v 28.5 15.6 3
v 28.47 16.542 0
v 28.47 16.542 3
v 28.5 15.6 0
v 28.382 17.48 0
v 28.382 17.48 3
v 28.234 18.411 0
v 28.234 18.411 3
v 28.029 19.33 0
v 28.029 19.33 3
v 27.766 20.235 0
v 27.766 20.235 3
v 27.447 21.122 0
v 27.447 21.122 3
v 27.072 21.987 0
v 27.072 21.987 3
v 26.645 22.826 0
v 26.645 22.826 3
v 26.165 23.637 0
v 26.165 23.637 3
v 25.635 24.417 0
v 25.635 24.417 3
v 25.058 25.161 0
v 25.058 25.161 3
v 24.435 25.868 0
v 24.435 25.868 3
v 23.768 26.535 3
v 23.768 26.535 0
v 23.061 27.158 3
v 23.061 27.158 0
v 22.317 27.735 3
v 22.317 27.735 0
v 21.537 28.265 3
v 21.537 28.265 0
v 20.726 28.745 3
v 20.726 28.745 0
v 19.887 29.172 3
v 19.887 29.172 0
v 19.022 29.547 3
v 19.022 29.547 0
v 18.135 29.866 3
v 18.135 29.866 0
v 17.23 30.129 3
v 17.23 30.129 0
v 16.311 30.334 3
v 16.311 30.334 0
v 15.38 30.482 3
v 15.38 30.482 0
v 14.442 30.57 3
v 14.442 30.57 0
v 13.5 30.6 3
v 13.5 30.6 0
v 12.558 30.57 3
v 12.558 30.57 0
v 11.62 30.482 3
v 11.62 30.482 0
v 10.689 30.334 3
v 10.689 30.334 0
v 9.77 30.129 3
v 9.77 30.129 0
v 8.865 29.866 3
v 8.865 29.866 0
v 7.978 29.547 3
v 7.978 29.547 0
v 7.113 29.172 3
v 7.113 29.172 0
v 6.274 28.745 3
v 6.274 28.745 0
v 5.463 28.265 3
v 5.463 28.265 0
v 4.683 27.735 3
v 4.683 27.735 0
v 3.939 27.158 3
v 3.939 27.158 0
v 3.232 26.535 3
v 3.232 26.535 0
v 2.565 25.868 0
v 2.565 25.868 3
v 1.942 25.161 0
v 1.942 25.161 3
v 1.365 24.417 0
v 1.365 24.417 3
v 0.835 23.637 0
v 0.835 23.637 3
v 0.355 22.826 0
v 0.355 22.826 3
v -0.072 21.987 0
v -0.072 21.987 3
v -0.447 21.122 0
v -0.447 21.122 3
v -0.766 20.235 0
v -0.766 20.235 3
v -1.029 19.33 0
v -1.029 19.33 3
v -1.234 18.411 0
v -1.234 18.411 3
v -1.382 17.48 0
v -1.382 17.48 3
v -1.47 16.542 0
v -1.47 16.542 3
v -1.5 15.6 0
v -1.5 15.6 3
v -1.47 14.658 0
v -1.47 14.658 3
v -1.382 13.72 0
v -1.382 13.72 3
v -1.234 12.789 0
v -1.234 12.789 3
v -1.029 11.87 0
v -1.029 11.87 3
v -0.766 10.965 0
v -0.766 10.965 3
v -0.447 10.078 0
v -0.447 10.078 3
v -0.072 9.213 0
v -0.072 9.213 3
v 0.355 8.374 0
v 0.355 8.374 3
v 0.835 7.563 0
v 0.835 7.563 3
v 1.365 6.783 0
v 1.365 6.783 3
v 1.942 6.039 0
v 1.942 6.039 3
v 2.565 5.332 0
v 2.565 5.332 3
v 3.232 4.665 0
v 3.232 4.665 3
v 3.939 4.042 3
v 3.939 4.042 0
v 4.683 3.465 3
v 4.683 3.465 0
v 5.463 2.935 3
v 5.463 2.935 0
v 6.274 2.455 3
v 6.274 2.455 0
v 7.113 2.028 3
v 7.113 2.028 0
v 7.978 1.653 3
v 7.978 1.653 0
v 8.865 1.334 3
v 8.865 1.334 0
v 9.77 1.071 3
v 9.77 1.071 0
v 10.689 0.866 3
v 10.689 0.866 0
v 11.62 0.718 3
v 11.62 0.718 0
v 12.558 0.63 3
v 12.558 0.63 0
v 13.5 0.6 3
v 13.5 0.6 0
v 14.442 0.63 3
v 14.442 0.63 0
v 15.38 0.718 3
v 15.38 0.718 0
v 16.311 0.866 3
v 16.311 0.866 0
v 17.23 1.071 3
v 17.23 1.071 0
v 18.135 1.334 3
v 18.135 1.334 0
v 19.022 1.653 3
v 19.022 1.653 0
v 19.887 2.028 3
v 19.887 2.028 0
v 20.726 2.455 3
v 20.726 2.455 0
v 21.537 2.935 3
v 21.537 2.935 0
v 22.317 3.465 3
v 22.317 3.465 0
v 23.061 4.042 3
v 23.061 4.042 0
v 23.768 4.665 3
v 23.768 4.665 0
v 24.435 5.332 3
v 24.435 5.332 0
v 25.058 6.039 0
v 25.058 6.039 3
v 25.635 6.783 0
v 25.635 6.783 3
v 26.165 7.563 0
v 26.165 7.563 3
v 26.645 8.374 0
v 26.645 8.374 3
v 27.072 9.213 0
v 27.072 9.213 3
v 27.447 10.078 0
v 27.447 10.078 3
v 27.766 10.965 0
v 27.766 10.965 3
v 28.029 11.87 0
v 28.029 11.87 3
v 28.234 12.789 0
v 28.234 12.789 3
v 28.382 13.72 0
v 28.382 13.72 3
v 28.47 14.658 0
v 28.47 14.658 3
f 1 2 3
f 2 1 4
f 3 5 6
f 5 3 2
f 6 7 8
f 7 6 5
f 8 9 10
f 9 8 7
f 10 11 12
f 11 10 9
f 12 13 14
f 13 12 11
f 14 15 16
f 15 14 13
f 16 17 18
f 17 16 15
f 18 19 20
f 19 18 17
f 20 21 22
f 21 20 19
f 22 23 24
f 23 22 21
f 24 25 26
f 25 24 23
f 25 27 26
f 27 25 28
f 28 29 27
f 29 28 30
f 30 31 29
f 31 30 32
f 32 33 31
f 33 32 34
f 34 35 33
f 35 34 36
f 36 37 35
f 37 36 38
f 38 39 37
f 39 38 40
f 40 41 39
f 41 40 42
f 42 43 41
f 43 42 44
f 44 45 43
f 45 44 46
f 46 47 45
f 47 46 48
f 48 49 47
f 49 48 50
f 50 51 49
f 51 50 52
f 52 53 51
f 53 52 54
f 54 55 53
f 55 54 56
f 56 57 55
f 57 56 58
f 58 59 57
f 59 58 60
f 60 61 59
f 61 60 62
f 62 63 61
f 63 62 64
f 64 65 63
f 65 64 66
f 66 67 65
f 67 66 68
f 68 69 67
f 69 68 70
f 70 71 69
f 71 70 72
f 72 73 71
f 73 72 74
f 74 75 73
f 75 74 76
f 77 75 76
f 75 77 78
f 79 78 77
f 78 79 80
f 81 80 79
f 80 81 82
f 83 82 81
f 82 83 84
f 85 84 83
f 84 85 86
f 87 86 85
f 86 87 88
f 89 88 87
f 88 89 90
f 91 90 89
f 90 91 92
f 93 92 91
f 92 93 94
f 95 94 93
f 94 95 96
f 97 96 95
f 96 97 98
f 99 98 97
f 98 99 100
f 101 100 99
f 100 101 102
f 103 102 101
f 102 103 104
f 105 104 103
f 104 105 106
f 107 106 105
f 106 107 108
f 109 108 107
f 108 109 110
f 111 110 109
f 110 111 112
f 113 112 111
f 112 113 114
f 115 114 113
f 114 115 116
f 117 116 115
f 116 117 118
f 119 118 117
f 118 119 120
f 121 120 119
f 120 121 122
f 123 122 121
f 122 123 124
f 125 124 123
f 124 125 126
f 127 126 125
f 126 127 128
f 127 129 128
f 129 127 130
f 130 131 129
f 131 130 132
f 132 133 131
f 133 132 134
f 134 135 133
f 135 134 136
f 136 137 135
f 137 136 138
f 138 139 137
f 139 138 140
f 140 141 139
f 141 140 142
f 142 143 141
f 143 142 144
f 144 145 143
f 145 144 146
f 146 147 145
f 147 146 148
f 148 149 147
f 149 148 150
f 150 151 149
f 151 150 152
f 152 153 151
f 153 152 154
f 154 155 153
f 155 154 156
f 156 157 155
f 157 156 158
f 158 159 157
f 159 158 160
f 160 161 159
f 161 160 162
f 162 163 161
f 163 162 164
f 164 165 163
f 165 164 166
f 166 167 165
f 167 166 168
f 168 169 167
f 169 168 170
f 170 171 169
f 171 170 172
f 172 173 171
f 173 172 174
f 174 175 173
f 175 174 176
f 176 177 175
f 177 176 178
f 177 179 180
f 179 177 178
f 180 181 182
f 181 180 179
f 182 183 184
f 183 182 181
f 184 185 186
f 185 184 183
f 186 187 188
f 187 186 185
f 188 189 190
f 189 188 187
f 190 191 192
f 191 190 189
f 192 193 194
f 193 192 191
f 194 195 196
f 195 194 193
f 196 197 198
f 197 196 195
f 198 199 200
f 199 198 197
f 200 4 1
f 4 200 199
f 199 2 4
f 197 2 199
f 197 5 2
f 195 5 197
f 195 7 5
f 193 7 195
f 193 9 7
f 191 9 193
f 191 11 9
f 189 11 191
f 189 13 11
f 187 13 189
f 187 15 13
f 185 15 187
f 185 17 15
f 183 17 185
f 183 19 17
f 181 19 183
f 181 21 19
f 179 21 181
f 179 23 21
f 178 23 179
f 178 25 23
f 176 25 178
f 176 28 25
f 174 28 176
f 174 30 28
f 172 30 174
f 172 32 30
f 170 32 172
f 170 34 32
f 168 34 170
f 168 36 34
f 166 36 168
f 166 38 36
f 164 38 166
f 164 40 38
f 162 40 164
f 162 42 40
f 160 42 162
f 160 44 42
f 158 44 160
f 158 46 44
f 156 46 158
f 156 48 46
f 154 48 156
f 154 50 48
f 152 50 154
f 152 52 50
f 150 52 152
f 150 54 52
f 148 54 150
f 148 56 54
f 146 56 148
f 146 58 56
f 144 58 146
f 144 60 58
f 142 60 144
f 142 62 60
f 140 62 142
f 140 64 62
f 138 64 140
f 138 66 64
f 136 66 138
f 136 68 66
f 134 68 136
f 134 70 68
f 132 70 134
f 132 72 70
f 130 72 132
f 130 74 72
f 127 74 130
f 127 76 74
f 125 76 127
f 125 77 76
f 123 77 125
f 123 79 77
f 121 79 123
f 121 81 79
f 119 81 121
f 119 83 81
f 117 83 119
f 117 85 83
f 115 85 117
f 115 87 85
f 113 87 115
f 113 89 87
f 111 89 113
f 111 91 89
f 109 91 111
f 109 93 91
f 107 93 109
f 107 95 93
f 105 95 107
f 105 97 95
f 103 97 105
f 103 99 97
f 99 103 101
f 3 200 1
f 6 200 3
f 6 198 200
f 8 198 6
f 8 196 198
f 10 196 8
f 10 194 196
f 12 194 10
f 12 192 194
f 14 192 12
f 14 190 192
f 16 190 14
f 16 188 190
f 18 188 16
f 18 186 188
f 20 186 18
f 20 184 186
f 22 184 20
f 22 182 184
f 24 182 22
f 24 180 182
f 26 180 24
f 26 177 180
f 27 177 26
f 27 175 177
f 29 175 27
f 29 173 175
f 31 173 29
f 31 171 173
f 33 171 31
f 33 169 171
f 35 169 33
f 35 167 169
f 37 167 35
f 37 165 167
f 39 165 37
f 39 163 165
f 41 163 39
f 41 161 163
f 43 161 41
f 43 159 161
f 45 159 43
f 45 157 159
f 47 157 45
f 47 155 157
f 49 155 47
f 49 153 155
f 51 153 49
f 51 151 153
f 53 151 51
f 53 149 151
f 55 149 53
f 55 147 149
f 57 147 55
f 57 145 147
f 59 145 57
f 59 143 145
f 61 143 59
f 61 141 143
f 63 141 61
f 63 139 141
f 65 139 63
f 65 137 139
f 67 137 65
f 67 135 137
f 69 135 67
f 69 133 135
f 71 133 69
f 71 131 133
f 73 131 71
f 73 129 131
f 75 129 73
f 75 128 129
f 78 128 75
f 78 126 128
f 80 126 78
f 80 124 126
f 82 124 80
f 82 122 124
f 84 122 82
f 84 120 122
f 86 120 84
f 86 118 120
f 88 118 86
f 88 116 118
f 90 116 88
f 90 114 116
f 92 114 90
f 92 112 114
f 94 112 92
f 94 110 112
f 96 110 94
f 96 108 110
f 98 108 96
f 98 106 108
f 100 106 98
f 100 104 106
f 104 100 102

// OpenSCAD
$fn=100;
//difference(){
    translate([13.5,15.6,0])
cylinder(r=15,h=3);

translate([0,0,0])
linear_extrude(height =5, center = true, convexity = 10 )
scale([0.009,.009,1])
import (file = "glglasses.dxf");
    
//}
